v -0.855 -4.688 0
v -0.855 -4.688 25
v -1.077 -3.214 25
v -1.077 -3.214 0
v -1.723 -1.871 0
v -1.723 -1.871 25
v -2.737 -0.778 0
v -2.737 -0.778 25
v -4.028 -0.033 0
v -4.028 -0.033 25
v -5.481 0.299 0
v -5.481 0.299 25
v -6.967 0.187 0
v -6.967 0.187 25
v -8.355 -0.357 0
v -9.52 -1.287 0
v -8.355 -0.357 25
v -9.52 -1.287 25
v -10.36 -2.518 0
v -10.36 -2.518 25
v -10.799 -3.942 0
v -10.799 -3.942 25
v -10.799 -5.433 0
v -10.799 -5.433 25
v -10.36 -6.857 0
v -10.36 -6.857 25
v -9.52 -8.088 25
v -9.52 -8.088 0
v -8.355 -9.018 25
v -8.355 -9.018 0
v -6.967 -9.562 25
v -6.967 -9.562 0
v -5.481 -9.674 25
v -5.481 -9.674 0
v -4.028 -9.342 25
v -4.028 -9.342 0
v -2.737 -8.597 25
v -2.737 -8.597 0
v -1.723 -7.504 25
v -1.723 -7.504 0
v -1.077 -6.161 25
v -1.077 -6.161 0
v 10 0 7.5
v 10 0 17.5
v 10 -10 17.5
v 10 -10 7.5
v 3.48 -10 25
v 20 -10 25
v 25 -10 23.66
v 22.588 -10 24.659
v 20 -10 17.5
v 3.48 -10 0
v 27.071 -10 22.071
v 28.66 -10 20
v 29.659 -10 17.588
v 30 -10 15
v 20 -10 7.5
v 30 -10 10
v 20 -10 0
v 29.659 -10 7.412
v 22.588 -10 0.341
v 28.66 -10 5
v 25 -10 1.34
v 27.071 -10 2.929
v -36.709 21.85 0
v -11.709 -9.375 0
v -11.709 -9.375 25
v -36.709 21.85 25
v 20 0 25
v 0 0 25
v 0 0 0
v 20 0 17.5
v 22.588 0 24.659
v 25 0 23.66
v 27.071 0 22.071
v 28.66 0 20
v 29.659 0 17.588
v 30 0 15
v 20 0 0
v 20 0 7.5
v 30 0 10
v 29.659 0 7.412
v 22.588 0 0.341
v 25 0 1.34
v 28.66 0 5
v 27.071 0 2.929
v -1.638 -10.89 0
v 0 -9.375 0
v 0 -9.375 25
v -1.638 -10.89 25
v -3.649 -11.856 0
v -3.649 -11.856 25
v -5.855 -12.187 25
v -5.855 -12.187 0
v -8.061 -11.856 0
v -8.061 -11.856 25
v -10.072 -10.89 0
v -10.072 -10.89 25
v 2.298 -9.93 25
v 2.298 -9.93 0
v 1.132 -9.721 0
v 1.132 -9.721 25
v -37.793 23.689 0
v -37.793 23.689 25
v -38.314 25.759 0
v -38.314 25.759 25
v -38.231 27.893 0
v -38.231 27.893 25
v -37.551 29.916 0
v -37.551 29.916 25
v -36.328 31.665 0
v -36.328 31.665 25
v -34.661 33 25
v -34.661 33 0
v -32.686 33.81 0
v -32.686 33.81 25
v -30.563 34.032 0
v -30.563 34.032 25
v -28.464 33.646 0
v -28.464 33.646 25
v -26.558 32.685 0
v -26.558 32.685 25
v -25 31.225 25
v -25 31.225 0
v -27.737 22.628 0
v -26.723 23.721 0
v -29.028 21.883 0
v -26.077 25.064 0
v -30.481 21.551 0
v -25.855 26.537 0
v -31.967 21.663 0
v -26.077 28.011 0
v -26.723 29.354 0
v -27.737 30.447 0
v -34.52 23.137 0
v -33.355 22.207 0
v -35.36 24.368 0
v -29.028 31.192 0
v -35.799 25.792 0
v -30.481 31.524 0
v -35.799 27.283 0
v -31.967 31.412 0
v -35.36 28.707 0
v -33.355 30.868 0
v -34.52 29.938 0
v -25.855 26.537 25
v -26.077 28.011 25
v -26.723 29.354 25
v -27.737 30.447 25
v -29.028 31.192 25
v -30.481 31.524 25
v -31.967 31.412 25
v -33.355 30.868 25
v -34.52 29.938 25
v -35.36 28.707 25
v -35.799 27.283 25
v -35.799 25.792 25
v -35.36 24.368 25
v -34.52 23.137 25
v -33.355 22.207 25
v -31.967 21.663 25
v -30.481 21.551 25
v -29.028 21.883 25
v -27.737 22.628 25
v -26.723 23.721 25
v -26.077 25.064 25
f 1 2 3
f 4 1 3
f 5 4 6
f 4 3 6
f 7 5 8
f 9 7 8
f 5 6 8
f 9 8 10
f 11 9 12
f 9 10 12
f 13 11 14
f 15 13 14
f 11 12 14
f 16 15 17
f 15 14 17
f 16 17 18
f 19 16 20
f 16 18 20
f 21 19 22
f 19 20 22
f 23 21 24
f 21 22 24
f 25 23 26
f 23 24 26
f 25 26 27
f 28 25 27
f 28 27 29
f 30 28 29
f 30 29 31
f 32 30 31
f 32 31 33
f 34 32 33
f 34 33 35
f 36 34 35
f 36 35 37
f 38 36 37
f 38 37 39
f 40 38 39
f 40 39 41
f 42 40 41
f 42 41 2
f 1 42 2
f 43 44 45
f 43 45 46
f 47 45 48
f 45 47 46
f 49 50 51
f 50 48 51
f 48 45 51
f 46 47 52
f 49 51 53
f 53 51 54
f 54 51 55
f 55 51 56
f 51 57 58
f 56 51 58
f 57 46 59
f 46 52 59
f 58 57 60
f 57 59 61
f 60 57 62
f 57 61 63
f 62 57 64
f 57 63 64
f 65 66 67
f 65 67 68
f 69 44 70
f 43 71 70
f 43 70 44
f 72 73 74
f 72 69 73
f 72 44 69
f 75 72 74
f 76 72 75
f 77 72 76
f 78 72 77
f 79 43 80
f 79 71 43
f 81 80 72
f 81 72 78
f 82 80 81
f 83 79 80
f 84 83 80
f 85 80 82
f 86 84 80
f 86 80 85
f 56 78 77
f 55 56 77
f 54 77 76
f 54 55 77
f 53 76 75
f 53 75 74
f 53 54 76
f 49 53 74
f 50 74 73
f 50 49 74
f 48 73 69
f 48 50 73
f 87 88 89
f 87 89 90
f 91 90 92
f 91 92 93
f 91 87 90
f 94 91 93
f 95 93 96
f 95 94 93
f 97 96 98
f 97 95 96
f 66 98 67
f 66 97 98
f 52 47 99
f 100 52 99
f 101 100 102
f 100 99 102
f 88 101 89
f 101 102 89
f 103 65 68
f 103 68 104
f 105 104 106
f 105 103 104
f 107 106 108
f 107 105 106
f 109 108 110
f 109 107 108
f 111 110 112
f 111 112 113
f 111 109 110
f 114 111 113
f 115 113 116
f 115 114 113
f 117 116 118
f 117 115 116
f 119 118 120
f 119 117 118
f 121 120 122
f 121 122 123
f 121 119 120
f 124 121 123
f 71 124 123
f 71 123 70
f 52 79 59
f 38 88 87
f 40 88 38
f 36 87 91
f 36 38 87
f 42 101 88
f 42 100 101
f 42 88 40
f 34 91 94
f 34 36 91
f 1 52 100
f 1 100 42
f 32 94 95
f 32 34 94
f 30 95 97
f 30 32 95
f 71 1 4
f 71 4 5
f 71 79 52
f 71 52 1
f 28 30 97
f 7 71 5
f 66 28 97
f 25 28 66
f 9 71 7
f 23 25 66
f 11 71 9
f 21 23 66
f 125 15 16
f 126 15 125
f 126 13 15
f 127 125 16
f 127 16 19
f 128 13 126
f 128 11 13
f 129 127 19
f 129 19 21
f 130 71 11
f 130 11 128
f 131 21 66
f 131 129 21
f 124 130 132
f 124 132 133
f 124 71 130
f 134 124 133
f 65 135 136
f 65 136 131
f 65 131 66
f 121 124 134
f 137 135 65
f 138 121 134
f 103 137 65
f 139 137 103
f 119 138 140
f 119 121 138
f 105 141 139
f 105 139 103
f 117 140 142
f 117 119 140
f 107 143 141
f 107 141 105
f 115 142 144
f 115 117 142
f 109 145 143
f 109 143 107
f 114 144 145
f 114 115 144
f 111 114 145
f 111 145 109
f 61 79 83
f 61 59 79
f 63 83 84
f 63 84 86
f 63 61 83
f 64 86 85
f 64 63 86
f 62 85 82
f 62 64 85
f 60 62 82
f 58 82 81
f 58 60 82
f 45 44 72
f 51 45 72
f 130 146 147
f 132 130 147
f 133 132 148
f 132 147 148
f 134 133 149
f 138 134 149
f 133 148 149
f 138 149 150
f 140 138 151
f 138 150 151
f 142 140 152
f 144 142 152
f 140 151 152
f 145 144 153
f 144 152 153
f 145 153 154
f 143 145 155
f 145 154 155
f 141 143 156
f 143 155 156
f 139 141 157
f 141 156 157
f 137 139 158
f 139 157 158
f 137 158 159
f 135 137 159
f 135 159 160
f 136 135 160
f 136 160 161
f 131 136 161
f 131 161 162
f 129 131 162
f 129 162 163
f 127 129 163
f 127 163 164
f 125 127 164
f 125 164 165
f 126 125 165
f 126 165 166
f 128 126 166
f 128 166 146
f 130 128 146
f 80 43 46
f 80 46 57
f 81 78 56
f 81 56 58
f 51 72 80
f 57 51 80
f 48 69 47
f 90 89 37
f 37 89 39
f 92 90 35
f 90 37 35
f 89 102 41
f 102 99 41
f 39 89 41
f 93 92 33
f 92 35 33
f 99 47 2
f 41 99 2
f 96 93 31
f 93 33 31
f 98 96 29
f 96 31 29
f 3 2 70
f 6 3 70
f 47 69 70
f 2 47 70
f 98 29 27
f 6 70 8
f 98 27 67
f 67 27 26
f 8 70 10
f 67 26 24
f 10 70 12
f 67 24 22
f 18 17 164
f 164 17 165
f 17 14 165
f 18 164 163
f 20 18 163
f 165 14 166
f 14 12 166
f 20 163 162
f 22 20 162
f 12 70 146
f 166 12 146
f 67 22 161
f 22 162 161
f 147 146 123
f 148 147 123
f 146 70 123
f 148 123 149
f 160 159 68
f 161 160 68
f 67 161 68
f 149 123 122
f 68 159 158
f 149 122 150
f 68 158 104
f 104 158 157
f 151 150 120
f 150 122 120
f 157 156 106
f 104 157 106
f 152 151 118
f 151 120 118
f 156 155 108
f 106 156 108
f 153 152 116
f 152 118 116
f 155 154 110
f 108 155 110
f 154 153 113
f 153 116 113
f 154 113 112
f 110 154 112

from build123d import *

# Parameters (mm, degrees)
EXTRUDE_1_DEPTH     = 25
SKETCH_2_R          = 5
CUT_EXTRUDE_1_DEPTH = 58.049387676
SKETCH_6_W          = 30
SKETCH_6_H          = 25
EXTRUDE_2_DEPTH     = 10
SKETCH_7_W          = 10
SKETCH_7_H          = 10
CUT_EXTRUDE_2_DEPTH = 10
FILLET_1_R          = 10
FILLET_2_R          = 10


with BuildPart() as part:
    # 草图1 → 凸台-拉伸1 (new body)
    with BuildSketch(Plane.XY):
        with BuildLine():
            Line((-25, 31.224989992), (0, 0))
            ThreePointArc((0, 0), (-1.167185623, -10.542185623), (-11.709371247, -9.375))
            Line((-11.709371247, -9.375), (-36.709371247, 21.849989992))
            ThreePointArc((-36.709371247, 21.849989992), (-35.542185623, 32.392175615), (-25, 31.224989992))
        make_face()
    extrude(amount=EXTRUDE_1_DEPTH)

    # 草图2 → 切除-拉伸1 (cut, through all)
    with BuildSketch(Plane.XY.offset(25)):
        with Locations((-30.854685623, 26.537489992)):
            Circle(SKETCH_2_R)
        with Locations((-5.854685623, -4.6875)):
            Circle(SKETCH_2_R)
    extrude(amount=-CUT_EXTRUDE_1_DEPTH, mode=Mode.SUBTRACT)

    # 草图6 → 凸台-拉伸2 (add)
    with BuildSketch(Plane(origin=(0, 0, 0), x_dir=(1, 0, 0), z_dir=(0, 1, 0))):
        with Locations((15, -12.5)):
            Rectangle(SKETCH_6_W, SKETCH_6_H)
    extrude(amount=-EXTRUDE_2_DEPTH)

    # 草图7 → 切除-拉伸2 (cut)
    with BuildSketch(Plane(origin=(0, 0, 0), x_dir=(1, 0, 0), z_dir=(0, 1, 0))):
        with Locations((15, -12.5)):
            Rectangle(SKETCH_7_W, SKETCH_7_H)
    extrude(amount=-CUT_EXTRUDE_2_DEPTH, mode=Mode.SUBTRACT)

    # 圆角1
    fillet_1_edges = [part.edges().sort_by_distance(p)[0] for p in [
        (30, -5, 0),
        (30, -5, 25),
    ]]
    fillet(fillet_1_edges, radius=FILLET_1_R)

    # 圆角2
    # the kernel refuses this fillet: 10 mm, written as the material it takes off along each edge
    with BuildSketch(Plane(origin=(0, -10, 33.699631817), x_dir=(1, 0, 0), z_dir=(0, 0, -1))) as fillet_2_piece_1:
        with BuildLine():
            CenterArc((3.479852727, -10), FILLET_2_R, 90, 20.364134806)
            Line((0, -0.625), (-0.069597055, -0.4375))
            ThreePointArc((-0.069597055, -0.4375), (-0.2, -0.3125), (-0.2, 0))
            Line((-0.2, 0), (0, 0.2))
            Line((0, 0.2), (3.479852727, 0.2))
            Line((3.479852727, 0.2), (3.479852727, 0))
        make_face()
    extrude(amount=42.399263634, mode=Mode.SUBTRACT)


solid = part.part
